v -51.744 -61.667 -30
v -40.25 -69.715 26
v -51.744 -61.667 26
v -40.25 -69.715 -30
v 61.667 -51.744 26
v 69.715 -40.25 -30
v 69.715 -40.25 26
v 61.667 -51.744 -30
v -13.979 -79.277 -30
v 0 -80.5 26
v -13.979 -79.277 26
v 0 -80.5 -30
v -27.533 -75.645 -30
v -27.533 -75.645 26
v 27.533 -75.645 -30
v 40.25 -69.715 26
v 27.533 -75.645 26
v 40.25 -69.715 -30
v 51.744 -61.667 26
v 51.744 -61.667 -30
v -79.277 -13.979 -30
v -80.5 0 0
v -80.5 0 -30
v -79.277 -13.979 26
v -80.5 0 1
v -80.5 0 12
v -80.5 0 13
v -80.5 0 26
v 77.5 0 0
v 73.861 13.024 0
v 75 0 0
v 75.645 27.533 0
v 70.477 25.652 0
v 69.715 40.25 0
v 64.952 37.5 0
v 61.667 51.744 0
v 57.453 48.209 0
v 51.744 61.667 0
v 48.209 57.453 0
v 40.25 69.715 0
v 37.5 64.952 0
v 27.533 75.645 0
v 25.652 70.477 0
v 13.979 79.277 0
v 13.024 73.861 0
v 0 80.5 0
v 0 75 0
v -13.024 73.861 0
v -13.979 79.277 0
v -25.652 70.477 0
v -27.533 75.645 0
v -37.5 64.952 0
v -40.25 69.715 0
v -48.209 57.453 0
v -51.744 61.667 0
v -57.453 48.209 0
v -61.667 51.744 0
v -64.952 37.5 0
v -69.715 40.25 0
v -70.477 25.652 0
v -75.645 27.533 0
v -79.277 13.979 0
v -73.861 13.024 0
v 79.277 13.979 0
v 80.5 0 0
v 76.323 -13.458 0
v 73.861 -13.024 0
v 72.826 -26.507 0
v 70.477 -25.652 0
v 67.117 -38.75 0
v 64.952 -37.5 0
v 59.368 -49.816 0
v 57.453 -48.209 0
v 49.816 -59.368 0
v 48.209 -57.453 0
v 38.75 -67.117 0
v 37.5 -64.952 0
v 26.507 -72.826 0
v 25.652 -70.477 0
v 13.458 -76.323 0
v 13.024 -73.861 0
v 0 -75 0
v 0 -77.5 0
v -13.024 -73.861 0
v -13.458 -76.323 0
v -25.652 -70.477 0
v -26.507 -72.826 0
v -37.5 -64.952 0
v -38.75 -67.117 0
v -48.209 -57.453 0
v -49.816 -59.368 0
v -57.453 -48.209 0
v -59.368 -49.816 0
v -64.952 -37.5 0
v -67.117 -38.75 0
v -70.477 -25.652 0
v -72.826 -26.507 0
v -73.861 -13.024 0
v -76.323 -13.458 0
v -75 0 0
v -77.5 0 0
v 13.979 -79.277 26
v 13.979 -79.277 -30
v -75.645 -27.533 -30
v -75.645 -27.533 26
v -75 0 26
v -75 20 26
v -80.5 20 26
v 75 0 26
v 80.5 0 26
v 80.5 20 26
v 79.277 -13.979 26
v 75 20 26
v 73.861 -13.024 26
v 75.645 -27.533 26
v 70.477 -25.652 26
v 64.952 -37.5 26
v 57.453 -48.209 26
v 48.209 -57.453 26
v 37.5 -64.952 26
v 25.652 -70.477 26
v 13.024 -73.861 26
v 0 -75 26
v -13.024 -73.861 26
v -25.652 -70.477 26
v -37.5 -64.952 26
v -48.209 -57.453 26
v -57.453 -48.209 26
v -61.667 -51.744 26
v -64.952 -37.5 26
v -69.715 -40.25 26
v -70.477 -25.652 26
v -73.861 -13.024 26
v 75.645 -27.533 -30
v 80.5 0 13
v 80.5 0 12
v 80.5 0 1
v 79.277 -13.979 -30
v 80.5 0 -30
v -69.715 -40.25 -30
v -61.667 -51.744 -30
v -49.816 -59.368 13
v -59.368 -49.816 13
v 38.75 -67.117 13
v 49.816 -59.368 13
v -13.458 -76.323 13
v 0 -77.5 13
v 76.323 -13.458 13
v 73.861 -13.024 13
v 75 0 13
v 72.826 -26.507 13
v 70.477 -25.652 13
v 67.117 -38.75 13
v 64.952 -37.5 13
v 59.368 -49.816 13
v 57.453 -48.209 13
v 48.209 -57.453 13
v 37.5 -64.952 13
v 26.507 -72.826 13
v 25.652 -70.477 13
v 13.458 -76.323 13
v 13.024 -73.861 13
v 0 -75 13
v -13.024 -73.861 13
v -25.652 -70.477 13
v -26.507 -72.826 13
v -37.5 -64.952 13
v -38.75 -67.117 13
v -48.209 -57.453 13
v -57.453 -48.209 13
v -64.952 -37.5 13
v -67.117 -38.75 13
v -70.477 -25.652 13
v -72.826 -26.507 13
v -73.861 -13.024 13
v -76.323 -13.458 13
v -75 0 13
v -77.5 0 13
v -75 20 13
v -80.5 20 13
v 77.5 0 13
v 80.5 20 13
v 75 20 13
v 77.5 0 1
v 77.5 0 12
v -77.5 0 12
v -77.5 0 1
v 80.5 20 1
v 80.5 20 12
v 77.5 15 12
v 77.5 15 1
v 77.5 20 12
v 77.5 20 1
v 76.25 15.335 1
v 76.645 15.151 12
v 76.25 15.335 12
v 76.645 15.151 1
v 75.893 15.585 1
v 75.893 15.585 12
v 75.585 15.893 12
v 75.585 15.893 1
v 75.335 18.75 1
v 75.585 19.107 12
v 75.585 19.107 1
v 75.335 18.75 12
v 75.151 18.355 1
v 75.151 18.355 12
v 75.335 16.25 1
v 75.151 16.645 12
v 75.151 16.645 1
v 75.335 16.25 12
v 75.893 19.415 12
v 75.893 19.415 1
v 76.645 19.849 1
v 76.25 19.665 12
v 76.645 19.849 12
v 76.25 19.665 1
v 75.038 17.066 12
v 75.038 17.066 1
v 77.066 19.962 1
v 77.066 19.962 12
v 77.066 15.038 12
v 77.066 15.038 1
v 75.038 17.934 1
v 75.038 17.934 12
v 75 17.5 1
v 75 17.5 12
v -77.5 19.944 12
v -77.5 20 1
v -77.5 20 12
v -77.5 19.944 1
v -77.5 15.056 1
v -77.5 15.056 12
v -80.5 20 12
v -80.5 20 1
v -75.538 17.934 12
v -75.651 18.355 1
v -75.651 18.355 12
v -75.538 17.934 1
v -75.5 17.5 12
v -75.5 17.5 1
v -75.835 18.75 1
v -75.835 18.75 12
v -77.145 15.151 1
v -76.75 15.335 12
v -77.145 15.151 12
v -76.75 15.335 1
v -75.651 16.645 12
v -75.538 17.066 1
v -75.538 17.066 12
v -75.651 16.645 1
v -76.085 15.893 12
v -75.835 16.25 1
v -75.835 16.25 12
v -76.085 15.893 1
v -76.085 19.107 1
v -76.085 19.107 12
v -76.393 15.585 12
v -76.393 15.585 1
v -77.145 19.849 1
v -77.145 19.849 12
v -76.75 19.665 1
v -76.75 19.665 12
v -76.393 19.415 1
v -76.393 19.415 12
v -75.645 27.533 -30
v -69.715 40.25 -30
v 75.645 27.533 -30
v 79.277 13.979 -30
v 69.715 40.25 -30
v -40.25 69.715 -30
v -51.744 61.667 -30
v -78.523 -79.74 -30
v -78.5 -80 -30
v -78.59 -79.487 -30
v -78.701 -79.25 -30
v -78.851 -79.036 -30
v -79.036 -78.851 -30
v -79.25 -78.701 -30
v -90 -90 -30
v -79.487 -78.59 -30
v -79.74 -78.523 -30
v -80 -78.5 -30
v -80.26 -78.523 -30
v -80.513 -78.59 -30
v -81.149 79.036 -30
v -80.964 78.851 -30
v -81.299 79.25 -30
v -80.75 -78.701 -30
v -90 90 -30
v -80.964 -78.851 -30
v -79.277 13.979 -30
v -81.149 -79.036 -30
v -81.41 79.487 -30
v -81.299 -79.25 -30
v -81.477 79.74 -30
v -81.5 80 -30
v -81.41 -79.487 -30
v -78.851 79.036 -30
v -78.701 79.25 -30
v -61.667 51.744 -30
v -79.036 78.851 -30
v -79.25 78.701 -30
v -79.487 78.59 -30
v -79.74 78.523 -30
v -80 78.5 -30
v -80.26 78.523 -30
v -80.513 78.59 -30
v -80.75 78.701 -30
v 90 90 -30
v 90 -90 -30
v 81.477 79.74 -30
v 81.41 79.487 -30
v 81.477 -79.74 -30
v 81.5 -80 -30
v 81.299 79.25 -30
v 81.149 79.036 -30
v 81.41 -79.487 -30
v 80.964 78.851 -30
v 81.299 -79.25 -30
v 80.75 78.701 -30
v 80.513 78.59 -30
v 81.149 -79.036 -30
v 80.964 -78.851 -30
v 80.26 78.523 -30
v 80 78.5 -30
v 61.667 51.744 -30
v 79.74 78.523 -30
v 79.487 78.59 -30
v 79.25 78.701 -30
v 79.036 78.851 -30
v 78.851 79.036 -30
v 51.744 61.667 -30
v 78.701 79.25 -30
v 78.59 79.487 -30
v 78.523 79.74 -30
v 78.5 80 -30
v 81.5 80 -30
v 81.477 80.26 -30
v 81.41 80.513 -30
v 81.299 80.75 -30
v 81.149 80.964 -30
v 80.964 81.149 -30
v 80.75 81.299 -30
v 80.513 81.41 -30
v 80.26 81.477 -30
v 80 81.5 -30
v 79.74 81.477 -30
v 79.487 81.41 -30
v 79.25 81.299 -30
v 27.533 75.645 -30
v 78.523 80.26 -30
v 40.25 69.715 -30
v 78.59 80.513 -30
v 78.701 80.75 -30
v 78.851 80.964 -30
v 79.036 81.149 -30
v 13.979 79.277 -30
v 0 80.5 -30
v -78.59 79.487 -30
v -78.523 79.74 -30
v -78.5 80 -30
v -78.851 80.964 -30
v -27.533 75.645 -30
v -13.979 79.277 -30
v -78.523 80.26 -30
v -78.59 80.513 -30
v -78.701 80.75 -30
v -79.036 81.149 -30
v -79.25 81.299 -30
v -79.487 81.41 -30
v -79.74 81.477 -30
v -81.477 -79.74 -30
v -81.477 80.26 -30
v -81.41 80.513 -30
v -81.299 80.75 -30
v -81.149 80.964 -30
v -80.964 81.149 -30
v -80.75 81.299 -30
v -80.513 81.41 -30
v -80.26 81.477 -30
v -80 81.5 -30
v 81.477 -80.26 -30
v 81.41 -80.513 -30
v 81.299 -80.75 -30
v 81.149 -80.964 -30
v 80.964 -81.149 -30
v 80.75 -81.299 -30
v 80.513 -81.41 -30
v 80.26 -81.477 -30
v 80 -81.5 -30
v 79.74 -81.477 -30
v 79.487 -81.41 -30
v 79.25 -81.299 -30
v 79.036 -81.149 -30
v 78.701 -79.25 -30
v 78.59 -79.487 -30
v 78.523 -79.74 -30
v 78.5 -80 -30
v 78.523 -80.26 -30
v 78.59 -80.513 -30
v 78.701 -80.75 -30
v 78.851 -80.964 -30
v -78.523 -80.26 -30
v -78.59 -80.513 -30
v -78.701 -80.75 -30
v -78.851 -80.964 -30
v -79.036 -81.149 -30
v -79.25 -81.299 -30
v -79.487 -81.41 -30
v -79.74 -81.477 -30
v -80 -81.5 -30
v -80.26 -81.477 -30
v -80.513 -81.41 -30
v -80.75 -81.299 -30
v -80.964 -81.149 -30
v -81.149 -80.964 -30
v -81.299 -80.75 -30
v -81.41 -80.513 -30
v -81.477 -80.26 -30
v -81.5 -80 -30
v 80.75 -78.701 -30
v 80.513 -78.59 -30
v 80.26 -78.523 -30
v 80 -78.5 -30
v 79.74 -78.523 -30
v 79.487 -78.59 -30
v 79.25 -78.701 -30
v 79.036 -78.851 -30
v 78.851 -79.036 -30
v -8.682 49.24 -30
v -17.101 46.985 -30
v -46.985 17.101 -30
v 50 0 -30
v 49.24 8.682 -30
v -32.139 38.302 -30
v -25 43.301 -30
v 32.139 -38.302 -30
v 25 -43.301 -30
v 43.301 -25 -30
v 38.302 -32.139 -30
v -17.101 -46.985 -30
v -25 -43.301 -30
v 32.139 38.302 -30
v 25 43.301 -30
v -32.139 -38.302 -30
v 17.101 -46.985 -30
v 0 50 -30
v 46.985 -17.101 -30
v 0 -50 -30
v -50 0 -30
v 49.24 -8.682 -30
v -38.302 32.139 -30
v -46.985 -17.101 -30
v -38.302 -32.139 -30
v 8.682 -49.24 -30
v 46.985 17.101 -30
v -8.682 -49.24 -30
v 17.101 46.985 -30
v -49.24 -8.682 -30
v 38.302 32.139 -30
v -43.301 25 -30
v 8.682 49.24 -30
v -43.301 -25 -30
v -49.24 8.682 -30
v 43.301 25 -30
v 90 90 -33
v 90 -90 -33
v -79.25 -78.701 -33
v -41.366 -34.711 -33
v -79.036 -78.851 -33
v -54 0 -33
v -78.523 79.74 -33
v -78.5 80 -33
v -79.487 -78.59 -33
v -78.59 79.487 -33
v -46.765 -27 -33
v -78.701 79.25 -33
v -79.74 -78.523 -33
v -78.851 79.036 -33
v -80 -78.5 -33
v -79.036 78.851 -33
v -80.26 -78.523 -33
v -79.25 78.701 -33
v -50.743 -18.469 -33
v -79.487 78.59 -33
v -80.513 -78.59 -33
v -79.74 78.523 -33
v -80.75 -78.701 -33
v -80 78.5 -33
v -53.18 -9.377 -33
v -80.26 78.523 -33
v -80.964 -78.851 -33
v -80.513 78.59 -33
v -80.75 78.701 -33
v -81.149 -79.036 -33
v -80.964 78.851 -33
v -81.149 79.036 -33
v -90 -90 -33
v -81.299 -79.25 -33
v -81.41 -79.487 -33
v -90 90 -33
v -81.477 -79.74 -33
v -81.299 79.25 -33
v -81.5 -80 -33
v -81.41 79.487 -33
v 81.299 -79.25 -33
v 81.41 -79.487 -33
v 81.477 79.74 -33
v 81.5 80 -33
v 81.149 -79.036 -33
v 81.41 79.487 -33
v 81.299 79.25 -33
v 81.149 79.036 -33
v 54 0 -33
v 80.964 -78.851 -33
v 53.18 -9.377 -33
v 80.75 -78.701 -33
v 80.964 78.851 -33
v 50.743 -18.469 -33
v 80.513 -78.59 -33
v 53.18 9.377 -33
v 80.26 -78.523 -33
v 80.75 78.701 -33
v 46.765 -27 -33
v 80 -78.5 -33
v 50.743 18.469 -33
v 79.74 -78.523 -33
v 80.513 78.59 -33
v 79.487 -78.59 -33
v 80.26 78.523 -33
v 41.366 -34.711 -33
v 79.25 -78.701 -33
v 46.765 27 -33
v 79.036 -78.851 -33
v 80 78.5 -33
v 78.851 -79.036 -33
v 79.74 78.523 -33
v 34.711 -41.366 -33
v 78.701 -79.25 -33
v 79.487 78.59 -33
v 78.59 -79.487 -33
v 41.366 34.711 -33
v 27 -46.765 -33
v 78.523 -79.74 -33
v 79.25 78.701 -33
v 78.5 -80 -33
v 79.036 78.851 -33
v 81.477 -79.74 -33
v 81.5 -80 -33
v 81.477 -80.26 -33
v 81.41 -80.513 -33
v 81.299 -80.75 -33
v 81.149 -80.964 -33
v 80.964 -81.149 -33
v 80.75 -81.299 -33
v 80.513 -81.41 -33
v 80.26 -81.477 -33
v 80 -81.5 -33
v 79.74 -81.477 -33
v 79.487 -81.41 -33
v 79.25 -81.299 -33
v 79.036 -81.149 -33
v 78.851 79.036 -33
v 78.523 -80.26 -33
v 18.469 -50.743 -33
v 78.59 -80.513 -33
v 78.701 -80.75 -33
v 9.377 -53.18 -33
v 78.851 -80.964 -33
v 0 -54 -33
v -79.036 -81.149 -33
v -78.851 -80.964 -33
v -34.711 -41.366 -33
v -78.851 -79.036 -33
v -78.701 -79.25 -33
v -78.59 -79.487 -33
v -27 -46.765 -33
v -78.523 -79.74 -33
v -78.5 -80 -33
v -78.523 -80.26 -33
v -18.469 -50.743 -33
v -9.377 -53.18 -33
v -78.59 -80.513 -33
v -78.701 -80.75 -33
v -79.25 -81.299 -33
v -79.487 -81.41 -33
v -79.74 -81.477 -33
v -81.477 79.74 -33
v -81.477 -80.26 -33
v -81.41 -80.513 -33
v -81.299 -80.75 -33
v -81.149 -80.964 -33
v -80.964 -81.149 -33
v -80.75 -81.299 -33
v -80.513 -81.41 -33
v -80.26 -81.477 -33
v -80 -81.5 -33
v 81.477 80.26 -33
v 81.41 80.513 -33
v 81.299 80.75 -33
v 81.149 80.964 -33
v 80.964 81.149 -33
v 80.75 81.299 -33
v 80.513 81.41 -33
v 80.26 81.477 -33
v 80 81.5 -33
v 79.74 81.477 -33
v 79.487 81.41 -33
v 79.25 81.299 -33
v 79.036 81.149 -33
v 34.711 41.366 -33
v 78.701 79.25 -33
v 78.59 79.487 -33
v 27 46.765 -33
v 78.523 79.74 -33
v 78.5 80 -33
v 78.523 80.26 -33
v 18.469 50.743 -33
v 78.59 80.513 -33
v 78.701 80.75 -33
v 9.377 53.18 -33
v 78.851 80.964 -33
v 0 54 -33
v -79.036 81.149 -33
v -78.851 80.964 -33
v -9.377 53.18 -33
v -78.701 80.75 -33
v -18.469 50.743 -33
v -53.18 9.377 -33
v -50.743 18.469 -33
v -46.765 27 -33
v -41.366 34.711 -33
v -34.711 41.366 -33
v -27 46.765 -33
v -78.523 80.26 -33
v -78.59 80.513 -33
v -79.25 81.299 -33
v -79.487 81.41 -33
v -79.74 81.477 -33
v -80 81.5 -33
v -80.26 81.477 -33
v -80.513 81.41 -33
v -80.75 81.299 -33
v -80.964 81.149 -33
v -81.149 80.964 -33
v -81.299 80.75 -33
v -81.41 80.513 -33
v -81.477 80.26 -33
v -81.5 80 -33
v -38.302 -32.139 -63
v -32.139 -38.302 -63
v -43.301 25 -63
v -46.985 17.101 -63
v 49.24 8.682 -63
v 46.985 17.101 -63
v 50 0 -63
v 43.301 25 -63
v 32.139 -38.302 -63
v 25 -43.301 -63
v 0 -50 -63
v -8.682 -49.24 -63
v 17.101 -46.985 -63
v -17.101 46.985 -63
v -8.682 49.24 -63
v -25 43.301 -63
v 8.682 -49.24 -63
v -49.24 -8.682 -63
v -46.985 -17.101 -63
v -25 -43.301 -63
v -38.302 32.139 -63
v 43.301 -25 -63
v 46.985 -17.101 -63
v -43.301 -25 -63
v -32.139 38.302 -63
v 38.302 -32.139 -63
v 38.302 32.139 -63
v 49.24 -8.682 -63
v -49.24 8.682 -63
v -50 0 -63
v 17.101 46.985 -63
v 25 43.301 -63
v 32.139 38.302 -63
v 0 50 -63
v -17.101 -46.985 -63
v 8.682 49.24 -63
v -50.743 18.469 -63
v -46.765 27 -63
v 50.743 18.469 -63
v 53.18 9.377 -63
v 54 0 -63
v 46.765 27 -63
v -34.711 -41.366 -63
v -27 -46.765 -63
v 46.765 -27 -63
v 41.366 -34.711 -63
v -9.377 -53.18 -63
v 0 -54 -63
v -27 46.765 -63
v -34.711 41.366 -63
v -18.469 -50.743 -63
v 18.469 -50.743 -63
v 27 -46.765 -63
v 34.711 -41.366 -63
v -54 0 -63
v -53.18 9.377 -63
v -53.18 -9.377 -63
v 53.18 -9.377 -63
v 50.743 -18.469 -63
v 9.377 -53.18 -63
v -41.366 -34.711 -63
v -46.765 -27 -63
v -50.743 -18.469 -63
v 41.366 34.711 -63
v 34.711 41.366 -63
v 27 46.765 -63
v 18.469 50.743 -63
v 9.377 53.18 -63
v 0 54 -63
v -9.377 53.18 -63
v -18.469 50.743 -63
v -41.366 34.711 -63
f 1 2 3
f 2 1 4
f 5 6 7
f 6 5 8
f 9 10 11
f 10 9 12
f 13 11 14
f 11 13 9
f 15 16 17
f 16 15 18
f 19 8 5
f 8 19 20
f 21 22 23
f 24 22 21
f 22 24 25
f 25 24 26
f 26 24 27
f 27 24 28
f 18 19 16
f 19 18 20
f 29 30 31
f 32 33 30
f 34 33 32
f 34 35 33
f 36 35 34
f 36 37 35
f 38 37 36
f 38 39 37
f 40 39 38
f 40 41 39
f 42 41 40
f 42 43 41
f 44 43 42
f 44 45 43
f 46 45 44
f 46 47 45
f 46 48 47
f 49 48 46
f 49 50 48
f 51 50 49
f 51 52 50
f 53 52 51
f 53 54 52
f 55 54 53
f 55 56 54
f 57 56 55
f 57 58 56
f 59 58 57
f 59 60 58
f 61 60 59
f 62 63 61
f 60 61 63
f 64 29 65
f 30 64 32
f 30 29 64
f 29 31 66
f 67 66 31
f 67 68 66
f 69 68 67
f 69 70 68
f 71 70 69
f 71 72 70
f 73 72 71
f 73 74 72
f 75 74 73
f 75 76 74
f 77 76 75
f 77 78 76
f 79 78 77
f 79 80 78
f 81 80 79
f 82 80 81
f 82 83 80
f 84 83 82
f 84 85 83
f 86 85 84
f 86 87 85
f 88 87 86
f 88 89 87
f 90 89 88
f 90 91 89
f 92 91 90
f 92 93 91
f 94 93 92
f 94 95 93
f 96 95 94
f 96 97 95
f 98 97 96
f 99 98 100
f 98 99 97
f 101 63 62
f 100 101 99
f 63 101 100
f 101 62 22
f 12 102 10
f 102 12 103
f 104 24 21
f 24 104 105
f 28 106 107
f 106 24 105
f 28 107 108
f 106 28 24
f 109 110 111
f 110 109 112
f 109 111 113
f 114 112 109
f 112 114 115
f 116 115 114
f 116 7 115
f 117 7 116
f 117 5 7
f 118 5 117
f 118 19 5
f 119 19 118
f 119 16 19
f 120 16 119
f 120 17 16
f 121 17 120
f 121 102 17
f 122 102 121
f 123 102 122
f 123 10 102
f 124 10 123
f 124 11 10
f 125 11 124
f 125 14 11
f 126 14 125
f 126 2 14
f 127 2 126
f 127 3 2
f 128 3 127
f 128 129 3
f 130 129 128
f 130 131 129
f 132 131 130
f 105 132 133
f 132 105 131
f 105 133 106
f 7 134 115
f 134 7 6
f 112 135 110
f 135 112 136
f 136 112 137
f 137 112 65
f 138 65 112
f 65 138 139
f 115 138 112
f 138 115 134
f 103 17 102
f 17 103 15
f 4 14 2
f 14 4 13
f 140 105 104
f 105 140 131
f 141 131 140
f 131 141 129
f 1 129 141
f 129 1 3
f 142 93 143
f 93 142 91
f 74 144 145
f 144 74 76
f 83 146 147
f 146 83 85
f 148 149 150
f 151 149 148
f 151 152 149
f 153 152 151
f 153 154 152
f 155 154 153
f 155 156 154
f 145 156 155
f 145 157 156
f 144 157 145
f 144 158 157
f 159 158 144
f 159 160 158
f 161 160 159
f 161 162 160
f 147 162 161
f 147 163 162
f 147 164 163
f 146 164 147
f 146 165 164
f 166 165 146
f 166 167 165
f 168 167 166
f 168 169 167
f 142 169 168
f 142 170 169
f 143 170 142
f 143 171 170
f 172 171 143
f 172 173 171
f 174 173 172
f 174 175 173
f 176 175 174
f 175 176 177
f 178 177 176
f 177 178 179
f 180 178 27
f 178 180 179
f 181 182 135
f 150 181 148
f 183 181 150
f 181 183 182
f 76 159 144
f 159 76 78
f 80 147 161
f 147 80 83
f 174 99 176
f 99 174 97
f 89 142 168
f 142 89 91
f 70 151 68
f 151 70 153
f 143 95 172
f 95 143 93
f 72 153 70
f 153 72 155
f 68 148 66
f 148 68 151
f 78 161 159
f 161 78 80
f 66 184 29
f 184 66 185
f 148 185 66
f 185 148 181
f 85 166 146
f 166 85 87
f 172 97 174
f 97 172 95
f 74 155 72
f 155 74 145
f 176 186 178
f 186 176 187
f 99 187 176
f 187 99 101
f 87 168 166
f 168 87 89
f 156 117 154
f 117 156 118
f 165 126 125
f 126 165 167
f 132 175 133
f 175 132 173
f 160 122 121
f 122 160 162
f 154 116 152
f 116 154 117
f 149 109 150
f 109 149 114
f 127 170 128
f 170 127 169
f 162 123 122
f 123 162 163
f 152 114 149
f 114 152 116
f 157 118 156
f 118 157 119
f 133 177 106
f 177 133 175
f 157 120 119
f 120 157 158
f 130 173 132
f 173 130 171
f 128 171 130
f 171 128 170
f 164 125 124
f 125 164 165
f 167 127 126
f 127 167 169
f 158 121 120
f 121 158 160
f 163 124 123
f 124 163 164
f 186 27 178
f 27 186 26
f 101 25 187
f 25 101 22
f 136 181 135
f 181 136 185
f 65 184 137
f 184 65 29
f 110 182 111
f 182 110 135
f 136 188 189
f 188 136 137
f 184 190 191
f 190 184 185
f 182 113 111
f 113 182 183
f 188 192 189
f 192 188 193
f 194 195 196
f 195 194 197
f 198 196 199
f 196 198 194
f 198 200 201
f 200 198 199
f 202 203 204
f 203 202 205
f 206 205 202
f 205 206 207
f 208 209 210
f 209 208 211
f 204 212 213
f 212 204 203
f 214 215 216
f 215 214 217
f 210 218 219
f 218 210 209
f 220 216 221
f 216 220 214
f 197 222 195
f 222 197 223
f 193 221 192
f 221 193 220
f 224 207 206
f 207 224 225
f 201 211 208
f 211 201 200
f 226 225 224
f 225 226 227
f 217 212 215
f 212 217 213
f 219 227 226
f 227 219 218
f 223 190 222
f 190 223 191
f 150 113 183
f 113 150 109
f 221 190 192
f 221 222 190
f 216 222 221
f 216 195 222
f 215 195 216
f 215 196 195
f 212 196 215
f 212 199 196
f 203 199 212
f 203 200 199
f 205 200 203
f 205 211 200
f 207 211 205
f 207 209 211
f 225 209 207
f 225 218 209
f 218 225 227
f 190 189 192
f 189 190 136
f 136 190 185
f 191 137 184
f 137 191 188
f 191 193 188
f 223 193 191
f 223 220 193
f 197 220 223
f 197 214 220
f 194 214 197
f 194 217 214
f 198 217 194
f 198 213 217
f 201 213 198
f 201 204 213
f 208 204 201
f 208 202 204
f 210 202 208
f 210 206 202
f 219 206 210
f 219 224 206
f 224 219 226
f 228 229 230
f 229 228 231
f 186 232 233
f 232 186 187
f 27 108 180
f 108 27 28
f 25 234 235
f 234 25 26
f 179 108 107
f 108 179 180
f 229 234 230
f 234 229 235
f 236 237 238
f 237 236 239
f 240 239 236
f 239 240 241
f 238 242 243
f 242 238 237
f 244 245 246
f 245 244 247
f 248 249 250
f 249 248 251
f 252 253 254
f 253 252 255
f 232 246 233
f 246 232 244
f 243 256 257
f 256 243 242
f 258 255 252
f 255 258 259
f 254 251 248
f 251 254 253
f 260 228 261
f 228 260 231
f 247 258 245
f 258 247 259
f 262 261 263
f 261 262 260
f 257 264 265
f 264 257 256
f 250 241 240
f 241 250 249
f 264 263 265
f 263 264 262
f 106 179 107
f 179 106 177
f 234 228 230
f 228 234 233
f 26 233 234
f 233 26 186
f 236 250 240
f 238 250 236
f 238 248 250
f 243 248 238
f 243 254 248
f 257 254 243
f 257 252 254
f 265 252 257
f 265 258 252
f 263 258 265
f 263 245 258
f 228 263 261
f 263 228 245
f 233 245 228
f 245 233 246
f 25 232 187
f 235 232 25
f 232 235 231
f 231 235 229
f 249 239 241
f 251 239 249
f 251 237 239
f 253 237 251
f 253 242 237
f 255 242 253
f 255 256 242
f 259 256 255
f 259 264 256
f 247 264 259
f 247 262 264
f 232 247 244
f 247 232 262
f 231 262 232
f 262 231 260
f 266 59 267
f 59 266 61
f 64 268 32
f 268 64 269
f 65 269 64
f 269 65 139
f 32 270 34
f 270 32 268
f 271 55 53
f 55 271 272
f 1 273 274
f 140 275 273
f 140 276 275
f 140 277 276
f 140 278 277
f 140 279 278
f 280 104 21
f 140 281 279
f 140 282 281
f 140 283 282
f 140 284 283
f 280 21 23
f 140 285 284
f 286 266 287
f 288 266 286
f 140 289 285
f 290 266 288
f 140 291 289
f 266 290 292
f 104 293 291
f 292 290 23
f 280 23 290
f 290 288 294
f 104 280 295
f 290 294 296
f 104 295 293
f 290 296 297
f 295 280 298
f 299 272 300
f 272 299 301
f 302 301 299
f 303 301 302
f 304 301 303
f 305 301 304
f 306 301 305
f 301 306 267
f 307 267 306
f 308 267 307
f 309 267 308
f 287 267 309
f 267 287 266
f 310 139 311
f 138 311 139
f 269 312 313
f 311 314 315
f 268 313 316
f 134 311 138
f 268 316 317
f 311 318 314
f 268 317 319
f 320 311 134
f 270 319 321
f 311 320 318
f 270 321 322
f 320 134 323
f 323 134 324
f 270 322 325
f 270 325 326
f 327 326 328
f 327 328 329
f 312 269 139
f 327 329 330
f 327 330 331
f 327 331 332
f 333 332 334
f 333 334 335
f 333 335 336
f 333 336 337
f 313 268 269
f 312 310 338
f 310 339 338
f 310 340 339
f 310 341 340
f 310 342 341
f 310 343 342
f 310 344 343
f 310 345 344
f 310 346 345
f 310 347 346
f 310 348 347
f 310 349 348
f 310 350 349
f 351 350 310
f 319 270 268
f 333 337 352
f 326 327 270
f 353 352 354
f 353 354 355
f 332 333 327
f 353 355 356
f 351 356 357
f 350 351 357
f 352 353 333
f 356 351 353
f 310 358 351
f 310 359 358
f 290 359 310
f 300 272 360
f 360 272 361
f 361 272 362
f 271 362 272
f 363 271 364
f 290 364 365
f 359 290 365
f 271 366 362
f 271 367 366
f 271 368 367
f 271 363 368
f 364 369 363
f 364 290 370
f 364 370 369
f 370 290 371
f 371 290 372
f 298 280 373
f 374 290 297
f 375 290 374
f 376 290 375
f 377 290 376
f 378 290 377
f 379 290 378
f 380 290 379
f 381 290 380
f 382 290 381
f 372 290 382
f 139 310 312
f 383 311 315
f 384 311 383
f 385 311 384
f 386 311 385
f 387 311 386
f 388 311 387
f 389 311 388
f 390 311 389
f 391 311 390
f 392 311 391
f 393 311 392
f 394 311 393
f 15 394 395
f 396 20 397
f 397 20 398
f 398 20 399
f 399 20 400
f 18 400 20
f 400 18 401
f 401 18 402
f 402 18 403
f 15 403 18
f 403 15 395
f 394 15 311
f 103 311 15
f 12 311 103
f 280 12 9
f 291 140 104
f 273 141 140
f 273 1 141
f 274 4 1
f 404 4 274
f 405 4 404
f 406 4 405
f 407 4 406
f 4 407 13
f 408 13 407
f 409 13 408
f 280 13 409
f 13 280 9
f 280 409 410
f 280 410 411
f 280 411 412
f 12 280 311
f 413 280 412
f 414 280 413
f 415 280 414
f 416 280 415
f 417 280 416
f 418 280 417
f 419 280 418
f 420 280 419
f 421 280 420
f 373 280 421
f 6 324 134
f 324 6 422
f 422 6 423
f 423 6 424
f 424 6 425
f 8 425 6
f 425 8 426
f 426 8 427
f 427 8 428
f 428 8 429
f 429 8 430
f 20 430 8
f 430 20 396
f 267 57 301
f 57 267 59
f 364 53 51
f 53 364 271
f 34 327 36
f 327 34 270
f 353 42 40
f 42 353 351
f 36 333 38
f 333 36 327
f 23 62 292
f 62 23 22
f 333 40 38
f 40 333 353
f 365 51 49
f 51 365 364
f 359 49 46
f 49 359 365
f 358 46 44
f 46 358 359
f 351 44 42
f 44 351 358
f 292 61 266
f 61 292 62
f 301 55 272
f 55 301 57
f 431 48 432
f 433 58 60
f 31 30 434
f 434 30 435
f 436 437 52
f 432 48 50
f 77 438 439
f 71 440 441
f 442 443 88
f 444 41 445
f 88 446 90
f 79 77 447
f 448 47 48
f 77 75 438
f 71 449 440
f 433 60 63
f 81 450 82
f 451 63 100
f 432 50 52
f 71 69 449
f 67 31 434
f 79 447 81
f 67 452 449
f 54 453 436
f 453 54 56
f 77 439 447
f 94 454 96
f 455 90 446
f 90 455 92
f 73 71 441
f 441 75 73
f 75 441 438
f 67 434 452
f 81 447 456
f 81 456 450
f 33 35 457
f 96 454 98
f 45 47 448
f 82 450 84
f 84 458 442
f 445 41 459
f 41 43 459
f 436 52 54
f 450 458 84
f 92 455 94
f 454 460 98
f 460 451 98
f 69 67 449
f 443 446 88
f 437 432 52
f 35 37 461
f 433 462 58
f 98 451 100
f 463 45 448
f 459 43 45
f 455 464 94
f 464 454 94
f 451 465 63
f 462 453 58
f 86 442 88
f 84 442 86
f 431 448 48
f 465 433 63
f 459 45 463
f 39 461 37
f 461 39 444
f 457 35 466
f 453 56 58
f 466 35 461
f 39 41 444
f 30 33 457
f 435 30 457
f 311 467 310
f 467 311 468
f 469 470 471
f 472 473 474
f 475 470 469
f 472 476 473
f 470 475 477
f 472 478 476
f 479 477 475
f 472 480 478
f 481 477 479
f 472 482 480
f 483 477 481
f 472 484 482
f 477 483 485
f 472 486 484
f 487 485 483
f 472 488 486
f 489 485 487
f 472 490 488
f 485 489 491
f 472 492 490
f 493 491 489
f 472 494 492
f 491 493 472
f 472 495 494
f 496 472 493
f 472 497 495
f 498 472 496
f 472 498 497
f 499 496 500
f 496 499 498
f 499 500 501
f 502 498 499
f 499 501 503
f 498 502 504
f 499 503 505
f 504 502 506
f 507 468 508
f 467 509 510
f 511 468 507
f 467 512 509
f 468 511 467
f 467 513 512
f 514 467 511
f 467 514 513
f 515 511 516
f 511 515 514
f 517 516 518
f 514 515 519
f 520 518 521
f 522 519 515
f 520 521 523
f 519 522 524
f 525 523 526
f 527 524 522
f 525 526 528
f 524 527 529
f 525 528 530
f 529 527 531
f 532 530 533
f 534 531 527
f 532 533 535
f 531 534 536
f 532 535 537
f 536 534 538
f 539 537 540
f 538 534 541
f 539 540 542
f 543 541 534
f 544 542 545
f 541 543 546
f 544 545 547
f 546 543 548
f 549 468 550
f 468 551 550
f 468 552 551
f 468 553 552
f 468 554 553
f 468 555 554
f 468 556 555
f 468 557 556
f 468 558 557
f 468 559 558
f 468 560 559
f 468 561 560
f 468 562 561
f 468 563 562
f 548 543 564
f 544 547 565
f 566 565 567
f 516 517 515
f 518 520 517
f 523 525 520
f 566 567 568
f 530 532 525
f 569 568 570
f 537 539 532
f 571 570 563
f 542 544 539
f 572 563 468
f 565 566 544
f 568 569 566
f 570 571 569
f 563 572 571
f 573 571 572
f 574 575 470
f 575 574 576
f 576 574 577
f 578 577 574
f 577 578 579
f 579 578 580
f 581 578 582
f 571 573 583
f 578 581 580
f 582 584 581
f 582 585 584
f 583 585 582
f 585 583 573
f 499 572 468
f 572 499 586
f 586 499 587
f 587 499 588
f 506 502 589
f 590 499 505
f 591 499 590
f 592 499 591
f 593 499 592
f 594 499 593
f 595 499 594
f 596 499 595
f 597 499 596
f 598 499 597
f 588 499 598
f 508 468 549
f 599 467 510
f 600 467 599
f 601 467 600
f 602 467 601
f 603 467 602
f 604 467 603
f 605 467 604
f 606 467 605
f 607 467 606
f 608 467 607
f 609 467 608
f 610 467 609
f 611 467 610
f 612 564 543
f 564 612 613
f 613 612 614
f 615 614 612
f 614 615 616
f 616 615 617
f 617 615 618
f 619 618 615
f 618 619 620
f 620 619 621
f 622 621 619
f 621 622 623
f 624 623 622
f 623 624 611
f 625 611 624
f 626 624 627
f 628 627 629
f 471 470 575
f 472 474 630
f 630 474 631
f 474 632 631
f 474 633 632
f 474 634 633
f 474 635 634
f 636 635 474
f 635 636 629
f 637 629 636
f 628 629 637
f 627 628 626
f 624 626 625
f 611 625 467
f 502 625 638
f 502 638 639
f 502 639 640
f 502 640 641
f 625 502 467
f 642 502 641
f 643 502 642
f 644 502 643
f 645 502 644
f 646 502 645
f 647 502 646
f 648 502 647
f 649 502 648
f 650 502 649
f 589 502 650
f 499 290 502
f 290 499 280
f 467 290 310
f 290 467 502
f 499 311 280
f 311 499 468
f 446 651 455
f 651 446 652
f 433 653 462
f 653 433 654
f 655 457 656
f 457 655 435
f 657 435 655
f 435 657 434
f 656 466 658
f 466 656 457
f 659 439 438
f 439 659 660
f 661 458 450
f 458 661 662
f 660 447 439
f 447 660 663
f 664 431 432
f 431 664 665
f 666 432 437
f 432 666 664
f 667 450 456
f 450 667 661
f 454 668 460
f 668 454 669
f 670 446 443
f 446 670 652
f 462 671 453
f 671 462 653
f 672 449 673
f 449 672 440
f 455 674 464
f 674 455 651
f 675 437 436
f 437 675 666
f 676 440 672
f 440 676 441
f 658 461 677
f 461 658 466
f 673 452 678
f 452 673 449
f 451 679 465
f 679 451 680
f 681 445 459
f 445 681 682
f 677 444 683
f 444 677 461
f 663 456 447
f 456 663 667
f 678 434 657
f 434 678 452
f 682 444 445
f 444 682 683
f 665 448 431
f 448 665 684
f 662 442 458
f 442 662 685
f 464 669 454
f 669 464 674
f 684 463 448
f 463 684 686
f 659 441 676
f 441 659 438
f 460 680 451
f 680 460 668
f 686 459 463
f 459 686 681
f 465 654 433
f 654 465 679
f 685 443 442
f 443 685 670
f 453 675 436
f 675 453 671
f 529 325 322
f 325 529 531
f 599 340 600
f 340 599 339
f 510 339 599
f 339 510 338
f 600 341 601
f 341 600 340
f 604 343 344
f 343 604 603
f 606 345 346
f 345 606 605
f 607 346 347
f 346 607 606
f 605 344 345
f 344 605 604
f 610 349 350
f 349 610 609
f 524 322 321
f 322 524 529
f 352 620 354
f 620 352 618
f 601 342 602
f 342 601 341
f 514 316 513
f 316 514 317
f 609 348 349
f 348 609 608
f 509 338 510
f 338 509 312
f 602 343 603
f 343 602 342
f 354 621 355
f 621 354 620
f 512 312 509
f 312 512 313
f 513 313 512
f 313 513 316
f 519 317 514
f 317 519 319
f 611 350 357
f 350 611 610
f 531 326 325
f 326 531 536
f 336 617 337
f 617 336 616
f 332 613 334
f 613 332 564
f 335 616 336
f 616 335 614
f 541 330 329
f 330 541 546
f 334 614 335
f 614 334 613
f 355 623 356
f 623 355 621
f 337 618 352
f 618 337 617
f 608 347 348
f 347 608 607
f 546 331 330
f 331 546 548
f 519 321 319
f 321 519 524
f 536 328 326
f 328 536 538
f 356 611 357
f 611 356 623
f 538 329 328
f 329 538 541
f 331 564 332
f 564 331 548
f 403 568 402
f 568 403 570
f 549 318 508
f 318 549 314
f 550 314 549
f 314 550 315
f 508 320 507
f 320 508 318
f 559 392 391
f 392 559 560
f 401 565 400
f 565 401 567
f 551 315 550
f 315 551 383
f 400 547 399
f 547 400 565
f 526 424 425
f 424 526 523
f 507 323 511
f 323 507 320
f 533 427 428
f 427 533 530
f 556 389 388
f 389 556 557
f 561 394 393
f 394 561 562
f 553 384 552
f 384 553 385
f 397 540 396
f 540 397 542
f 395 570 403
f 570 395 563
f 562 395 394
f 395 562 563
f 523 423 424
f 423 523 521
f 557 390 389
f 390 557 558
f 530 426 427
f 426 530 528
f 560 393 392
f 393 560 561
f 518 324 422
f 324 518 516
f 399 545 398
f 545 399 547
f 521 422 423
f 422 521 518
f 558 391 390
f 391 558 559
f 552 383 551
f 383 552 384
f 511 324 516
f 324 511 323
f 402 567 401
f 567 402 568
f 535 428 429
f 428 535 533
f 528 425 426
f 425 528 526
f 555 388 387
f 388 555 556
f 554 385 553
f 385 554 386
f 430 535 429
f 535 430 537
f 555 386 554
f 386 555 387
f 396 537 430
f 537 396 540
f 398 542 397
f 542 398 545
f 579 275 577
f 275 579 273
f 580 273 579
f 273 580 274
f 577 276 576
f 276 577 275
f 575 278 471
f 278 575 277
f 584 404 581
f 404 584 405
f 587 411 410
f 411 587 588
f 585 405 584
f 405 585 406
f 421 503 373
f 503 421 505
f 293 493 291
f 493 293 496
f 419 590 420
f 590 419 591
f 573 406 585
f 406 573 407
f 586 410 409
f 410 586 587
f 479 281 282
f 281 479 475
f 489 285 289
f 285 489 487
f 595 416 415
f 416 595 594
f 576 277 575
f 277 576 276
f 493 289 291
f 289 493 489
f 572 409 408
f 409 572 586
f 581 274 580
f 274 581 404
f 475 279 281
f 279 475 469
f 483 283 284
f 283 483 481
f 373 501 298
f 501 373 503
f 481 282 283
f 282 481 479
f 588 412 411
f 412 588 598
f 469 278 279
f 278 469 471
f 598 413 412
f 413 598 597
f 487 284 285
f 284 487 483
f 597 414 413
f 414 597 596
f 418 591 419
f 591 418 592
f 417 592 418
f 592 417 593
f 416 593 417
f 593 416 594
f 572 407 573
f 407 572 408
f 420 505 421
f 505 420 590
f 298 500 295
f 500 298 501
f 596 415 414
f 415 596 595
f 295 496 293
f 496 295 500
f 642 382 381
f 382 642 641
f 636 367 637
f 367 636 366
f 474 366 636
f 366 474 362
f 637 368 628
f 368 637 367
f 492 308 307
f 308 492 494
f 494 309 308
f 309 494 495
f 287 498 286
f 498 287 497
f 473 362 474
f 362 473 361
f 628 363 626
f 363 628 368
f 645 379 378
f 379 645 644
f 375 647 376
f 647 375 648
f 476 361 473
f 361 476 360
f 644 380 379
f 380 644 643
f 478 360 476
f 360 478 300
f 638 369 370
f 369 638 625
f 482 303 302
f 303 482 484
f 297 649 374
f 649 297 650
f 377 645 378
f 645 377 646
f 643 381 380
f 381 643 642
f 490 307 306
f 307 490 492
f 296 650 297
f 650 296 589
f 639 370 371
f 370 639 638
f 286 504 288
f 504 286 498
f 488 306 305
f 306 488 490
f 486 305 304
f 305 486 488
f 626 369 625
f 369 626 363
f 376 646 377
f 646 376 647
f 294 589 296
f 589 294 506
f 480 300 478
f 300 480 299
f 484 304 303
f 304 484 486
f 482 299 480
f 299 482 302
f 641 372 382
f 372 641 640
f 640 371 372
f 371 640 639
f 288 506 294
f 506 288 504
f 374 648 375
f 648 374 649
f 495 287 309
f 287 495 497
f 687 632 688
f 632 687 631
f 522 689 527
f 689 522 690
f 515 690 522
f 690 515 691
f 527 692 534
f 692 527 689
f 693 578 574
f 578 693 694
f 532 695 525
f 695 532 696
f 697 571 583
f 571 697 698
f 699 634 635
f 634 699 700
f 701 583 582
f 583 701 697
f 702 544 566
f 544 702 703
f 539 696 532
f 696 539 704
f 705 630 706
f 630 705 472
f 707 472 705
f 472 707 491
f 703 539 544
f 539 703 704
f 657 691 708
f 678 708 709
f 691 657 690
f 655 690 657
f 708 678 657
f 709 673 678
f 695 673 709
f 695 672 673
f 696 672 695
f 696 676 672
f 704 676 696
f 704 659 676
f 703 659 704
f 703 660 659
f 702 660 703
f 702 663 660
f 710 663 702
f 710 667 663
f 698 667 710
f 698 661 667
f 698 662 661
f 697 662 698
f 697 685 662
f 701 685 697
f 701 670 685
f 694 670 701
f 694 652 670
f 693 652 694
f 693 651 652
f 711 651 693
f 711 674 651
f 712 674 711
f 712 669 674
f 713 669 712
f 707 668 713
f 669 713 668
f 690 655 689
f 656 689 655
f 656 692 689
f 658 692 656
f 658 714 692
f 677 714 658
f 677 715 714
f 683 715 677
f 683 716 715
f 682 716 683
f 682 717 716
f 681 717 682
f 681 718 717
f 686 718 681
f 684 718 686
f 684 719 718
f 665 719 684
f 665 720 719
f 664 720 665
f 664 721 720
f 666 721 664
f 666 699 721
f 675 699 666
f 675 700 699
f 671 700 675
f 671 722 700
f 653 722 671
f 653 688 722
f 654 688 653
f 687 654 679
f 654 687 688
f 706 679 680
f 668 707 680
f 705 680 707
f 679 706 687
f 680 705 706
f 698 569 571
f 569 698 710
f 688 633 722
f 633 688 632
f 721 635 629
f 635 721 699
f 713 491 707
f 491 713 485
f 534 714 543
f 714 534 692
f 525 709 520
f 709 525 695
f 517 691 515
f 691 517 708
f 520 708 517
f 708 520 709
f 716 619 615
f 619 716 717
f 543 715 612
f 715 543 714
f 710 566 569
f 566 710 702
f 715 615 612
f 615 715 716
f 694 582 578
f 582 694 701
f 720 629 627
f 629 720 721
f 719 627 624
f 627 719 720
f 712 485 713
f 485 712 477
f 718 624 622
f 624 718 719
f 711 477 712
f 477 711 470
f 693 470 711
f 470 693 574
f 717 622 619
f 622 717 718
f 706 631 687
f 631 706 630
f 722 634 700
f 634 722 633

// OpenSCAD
//toshiba air duct reducer

/* Measurements:
ring at end of toshiba provided ducting:
(measured from adapter ring to sqaure duct piece)
height: 13.40mm - 13?
outer diameter > 153mm.... caliper too small
diameter by ruler - 156ish so 155mm?

ring on louverd flap:

wall cutout:


*/

/* TODO
x- add cutout so cosmetic upper half of ring (for ducting receiver) can be slid on top after inserting ducting?
x- screw holes
- make upper half slide-in retaining ring

- MEASURE STUFFFFFF!!!!!
*/


draftingFNs = 36;
renderFNs = 180;
$fn = draftingFNs;


ductRingHeight = 13;
ductRingOuterDiameter = 155;
ductRingInnerDiameter = 150;
ductRingWidth = (ductRingOuterDiameter - ductRingInnerDiameter)/2;
ductRingCouplerWallThickness = 3;
clipVerticalGap = 1;

arbitraryDuctReceiverHeightPadding = 20;
arbitraryWallPlateThickness = 3;

//reducerHeight = 0; // 48.01m filament, 15h14m print time
//reducerHeight = 10; // 56.27m filament, 17h02m print time
reducerHeight = 30; // 71.58m filament, 19h20m print time
//reducerHeight = 100; // 123.23m filament, 28h16m print time
reducerWallThickness = 7;
reducerInsideWallHeight = 30;
reducerInsideWallThickness = 4;

ventRingOuterDiameter = 100; //TODO measure!!!!!!!!!!!!!!!!!!!!!!!!!!!!!!

wallPlateWidth = 180;
screwHoleDiameter = 3;
screwHoleInset = 10;


difference(){
    //outer body of accepting ring for duct
    cylinder(ductRingHeight*2,ductRingOuterDiameter/2 + ductRingCouplerWallThickness,ductRingOuterDiameter/2 + ductRingCouplerWallThickness);
//    //TODO shift everything up so bottom of reducer is fat and more supporting
//    cylinder(reducerHeight + ductRingHeight*2,ductRingOuterDiameter/2 + ductRingCouplerWallThickness,ductRingOuterDiameter/2 + ductRingCouplerWallThickness);
    
    //remove area for ring at end of ducting
    cylinder(ductRingHeight,ductRingOuterDiameter/2,ductRingOuterDiameter/2);
    
    //remove area down-duct from outer ring of ducting
    translate([0,0,ductRingHeight]){
        cylinder(ductRingHeight,ductRingInnerDiameter/2,ductRingInnerDiameter/2);
    }
    
    //remove top half of ring so duct can slid in
    translate([-(ductRingOuterDiameter/2 + ductRingCouplerWallThickness),0,0]){
        cube([ductRingOuterDiameter+ductRingCouplerWallThickness*2,ductRingOuterDiameter/2 + ductRingCouplerWallThickness,reducerHeight + ductRingHeight*2]);
    }
}


//add cubes to extend up receving ring (for ducting)
//+x side
translate([(ductRingOuterDiameter/2),0,0]){
    difference(){
        union(){
            //lower wall
            cube([ductRingCouplerWallThickness,arbitraryDuctReceiverHeightPadding,ductRingHeight]);
            
            //clip bump
            translate([0,arbitraryDuctReceiverHeightPadding-ductRingWidth,0]){
                cylinder(ductRingHeight,ductRingWidth,ductRingWidth);
            }
            
            //upper wall
            translate([-ductRingWidth,0,ductRingHeight]){
                cube([ductRingCouplerWallThickness+ductRingWidth,arbitraryDuctReceiverHeightPadding,ductRingHeight]);
            }
        }//end union
        
        //top clip gap
        translate([-ductRingWidth,0,ductRingHeight-clipVerticalGap]){
            cube([ductRingCouplerWallThickness+ductRingWidth,arbitraryDuctReceiverHeightPadding,clipVerticalGap]);
        }
        
        //bottom clip gap
        translate([-ductRingWidth,0,0]){
            cube([ductRingCouplerWallThickness+ductRingWidth,arbitraryDuctReceiverHeightPadding,clipVerticalGap]);
        }
    }//end diff
}

//-x side
translate([-(ductRingOuterDiameter/2) - ductRingCouplerWallThickness,0,0]){
    difference(){
        union(){
            //lower wall
            cube([ductRingCouplerWallThickness,arbitraryDuctReceiverHeightPadding,ductRingHeight]);
    
    //clip bump
    translate([ductRingWidth,arbitraryDuctReceiverHeightPadding-ductRingWidth,0]){
        cylinder(ductRingHeight,ductRingWidth,ductRingWidth);
    }
    
    //uppper wall
    translate([-0,0,ductRingHeight]){
        cube([ductRingCouplerWallThickness+ductRingWidth,arbitraryDuctReceiverHeightPadding,ductRingHeight]);
    }
        }//end union
        
        //top clip gap
        translate([0,0,ductRingHeight-clipVerticalGap]){
            cube([ductRingCouplerWallThickness+ductRingWidth,arbitraryDuctReceiverHeightPadding,clipVerticalGap]);
        }
        
        //bottom clip gap
        translate([0,0,0]){
            cube([ductRingCouplerWallThickness+ductRingWidth,arbitraryDuctReceiverHeightPadding,clipVerticalGap]);
        }
    }//end diff
}


//reducer cone
translate([0,0,-reducerHeight]){
    //reducer cone - outside wall
    difference(){
    //    cylinder(reducerHeight,ventRingOuterDiameter/2 + reducerWallThickness,ductRingOuterDiameter/2 + ductRingCouplerWallThickness);
        cylinder(reducerHeight,ductRingOuterDiameter/2 + ductRingCouplerWallThickness,ductRingOuterDiameter/2 + ductRingCouplerWallThickness);
        cylinder(reducerHeight,ventRingOuterDiameter/2,ductRingInnerDiameter/2);
        
    }
}

//wall plate
difference(){
    translate([-wallPlateWidth/2,-wallPlateWidth/2,-arbitraryWallPlateThickness-reducerHeight]){
        cube([wallPlateWidth,wallPlateWidth,arbitraryWallPlateThickness]);
    }

    translate([0,0,-arbitraryWallPlateThickness-reducerHeight]){
    //remove hole for venting
        //todo change to flap diameter
    cylinder(arbitraryWallPlateThickness,ventRingOuterDiameter/2,ventRingOuterDiameter/2);
    }
    
    translate([wallPlateWidth/2-screwHoleInset,wallPlateWidth/2-screwHoleInset,-arbitraryWallPlateThickness-reducerHeight]){
        cylinder(arbitraryWallPlateThickness,screwHoleDiameter/2,screwHoleDiameter/2);
    }
    
    translate([wallPlateWidth/2-screwHoleInset,-(wallPlateWidth/2-screwHoleInset),-arbitraryWallPlateThickness-reducerHeight]){
        cylinder(arbitraryWallPlateThickness,screwHoleDiameter/2,screwHoleDiameter/2);
    }
    
    translate([-(wallPlateWidth/2-screwHoleInset),-(wallPlateWidth/2-screwHoleInset),-arbitraryWallPlateThickness-reducerHeight]){
        cylinder(arbitraryWallPlateThickness,screwHoleDiameter/2,screwHoleDiameter/2);
    }
    
    translate([-(wallPlateWidth/2-screwHoleInset),wallPlateWidth/2-screwHoleInset,-arbitraryWallPlateThickness-reducerHeight]){
        cylinder(arbitraryWallPlateThickness,screwHoleDiameter/2,screwHoleDiameter/2);
    }
}

//cylinder to inside of wall to mate to the vent ring
translate([0,0,-(arbitraryWallPlateThickness+reducerHeight+reducerInsideWallHeight)]){
    difference(){
        //outer wall
        
        cylinder(reducerInsideWallHeight,ventRingOuterDiameter/2 + reducerInsideWallThickness,ventRingOuterDiameter/2 + reducerInsideWallThickness);
        cylinder(reducerInsideWallHeight,ventRingOuterDiameter/2,ventRingOuterDiameter/2);
    }
}
